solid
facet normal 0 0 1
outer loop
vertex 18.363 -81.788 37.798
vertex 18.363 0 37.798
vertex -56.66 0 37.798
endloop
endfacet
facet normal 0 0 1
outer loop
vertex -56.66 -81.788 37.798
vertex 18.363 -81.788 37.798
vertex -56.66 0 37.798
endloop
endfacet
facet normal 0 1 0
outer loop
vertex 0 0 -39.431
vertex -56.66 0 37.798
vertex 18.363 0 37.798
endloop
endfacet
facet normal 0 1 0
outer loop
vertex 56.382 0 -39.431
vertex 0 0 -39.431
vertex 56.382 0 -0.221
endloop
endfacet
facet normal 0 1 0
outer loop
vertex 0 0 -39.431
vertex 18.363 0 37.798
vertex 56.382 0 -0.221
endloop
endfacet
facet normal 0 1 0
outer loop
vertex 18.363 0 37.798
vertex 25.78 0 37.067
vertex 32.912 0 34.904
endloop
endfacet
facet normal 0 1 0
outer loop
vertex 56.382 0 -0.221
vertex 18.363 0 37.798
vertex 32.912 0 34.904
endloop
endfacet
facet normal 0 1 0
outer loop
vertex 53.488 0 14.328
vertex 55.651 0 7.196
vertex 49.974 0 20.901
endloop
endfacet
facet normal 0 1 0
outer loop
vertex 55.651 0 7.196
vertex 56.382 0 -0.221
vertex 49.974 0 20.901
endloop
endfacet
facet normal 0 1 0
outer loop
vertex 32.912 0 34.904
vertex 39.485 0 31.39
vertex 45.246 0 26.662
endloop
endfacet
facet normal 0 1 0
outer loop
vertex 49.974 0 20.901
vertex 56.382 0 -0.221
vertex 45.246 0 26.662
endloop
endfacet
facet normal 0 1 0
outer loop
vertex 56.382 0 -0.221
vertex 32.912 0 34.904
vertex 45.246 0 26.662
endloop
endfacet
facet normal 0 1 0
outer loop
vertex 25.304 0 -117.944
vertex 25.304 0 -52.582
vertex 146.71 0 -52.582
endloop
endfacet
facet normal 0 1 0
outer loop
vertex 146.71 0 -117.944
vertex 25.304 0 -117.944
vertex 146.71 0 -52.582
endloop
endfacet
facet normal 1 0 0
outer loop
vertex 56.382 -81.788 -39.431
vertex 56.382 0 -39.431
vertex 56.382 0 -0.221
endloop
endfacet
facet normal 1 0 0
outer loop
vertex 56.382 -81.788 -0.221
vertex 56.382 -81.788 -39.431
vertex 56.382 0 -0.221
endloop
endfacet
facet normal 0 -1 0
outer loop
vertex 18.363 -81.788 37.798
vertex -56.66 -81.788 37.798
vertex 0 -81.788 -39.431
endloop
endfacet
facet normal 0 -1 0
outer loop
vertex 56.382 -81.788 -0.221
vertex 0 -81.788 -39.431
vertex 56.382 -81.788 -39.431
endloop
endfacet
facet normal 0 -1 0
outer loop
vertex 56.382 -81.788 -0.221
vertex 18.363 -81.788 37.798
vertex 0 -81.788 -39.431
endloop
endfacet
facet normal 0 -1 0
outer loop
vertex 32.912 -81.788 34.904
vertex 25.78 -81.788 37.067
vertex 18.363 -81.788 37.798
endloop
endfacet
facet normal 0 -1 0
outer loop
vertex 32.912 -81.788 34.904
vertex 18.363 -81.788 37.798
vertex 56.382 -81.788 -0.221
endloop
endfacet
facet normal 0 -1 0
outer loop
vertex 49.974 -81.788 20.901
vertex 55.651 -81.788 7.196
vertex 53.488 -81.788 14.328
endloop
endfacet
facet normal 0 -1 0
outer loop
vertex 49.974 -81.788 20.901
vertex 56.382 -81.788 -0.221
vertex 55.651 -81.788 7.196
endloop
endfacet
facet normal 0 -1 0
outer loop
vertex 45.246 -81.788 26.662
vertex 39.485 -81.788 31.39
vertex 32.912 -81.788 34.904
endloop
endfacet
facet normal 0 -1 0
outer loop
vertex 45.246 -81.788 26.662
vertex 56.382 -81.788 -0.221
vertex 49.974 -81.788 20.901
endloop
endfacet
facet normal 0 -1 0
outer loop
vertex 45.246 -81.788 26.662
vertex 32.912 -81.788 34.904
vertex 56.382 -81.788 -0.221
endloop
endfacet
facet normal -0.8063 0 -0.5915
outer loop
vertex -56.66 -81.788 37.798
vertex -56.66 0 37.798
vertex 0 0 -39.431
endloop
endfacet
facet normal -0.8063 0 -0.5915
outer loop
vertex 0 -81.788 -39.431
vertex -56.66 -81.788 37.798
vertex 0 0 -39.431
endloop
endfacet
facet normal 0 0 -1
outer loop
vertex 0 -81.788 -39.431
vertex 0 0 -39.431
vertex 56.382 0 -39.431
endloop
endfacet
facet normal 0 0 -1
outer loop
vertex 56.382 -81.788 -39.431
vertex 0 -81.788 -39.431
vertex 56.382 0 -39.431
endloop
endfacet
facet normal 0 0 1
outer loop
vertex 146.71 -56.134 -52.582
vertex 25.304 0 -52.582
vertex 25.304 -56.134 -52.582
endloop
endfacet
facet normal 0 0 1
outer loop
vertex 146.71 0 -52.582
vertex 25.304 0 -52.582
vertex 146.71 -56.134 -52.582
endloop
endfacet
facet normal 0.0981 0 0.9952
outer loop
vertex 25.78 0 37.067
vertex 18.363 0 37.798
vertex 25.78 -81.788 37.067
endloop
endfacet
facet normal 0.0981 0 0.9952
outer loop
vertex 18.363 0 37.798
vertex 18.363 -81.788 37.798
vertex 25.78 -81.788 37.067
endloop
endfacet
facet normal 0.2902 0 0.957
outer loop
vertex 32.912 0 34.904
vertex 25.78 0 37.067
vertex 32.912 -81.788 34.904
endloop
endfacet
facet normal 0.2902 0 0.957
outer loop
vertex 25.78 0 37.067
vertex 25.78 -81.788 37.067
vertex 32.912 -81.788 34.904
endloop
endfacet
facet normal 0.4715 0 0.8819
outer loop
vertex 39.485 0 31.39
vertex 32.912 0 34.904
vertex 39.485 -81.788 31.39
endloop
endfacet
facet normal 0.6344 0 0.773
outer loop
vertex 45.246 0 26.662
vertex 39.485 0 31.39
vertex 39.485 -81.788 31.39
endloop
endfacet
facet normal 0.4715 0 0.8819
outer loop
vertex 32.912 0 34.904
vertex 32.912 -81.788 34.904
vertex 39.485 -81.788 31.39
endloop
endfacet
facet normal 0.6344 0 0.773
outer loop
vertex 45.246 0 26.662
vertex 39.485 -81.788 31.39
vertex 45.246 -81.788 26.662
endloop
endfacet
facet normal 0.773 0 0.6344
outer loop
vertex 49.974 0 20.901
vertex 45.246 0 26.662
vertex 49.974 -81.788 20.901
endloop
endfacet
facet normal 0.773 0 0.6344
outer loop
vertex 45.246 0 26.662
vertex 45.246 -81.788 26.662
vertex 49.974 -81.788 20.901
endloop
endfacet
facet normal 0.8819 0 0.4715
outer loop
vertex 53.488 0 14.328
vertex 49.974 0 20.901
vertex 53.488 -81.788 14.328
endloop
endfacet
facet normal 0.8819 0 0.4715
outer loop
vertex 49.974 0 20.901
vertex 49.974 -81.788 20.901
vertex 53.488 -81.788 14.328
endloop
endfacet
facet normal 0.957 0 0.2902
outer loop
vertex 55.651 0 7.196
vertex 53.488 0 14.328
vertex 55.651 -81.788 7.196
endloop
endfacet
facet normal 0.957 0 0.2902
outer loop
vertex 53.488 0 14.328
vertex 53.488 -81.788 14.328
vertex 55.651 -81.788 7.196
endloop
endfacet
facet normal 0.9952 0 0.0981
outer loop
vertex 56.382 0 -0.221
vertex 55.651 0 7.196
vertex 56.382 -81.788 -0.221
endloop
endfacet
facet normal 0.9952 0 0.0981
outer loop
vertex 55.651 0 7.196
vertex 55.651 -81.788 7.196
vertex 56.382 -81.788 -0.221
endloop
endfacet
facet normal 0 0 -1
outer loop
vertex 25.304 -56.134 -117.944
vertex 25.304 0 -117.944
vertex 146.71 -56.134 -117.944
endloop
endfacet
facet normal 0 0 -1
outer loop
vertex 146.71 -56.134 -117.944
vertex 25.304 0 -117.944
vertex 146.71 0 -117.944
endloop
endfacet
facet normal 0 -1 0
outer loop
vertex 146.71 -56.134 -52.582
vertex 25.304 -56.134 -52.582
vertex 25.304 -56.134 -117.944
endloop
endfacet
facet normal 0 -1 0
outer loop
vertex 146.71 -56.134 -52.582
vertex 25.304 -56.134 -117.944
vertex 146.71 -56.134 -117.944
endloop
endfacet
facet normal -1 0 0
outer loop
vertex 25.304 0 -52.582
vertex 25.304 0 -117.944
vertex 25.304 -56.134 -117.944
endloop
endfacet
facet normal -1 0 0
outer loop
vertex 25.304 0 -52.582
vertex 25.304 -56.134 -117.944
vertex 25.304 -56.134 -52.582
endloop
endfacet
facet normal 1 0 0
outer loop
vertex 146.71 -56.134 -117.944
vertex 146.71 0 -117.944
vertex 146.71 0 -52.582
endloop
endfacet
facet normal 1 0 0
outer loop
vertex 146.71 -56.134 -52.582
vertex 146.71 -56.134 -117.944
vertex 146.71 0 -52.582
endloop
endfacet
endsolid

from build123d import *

# Parameters (mm, degrees)
F1_DEPTH = 81.788
F2_R     = 38.019035
F3_W     = 121.406894
F3_H     = 65.362315
F4_DEPTH = 56.134


with BuildPart() as f1:
    # F0 (on Front) → F1 (new body)
    with BuildSketch(Plane.XZ):
        Polygon((56.381635, 37.797861), (-56.66006, 37.797861), (0, -39.431129), (56.381635, -39.431129), align=None)
    extrude(amount=F1_DEPTH)

    # F2
    f2_edges = [f1.edges().sort_by_distance(p)[0] for p in [
        (56.381635, -40.894, 37.797861),
    ]]
    fillet(f2_edges, radius=F2_R)


with BuildPart() as f4:
    # F3 (on Front) → F4 (new body)
    with BuildSketch(Plane.XZ):
        with Locations((86.007008, -85.262814)):
            Rectangle(F3_W, F3_H)
    extrude(amount=F4_DEPTH)


solid = Compound([f1.part, f4.part])
